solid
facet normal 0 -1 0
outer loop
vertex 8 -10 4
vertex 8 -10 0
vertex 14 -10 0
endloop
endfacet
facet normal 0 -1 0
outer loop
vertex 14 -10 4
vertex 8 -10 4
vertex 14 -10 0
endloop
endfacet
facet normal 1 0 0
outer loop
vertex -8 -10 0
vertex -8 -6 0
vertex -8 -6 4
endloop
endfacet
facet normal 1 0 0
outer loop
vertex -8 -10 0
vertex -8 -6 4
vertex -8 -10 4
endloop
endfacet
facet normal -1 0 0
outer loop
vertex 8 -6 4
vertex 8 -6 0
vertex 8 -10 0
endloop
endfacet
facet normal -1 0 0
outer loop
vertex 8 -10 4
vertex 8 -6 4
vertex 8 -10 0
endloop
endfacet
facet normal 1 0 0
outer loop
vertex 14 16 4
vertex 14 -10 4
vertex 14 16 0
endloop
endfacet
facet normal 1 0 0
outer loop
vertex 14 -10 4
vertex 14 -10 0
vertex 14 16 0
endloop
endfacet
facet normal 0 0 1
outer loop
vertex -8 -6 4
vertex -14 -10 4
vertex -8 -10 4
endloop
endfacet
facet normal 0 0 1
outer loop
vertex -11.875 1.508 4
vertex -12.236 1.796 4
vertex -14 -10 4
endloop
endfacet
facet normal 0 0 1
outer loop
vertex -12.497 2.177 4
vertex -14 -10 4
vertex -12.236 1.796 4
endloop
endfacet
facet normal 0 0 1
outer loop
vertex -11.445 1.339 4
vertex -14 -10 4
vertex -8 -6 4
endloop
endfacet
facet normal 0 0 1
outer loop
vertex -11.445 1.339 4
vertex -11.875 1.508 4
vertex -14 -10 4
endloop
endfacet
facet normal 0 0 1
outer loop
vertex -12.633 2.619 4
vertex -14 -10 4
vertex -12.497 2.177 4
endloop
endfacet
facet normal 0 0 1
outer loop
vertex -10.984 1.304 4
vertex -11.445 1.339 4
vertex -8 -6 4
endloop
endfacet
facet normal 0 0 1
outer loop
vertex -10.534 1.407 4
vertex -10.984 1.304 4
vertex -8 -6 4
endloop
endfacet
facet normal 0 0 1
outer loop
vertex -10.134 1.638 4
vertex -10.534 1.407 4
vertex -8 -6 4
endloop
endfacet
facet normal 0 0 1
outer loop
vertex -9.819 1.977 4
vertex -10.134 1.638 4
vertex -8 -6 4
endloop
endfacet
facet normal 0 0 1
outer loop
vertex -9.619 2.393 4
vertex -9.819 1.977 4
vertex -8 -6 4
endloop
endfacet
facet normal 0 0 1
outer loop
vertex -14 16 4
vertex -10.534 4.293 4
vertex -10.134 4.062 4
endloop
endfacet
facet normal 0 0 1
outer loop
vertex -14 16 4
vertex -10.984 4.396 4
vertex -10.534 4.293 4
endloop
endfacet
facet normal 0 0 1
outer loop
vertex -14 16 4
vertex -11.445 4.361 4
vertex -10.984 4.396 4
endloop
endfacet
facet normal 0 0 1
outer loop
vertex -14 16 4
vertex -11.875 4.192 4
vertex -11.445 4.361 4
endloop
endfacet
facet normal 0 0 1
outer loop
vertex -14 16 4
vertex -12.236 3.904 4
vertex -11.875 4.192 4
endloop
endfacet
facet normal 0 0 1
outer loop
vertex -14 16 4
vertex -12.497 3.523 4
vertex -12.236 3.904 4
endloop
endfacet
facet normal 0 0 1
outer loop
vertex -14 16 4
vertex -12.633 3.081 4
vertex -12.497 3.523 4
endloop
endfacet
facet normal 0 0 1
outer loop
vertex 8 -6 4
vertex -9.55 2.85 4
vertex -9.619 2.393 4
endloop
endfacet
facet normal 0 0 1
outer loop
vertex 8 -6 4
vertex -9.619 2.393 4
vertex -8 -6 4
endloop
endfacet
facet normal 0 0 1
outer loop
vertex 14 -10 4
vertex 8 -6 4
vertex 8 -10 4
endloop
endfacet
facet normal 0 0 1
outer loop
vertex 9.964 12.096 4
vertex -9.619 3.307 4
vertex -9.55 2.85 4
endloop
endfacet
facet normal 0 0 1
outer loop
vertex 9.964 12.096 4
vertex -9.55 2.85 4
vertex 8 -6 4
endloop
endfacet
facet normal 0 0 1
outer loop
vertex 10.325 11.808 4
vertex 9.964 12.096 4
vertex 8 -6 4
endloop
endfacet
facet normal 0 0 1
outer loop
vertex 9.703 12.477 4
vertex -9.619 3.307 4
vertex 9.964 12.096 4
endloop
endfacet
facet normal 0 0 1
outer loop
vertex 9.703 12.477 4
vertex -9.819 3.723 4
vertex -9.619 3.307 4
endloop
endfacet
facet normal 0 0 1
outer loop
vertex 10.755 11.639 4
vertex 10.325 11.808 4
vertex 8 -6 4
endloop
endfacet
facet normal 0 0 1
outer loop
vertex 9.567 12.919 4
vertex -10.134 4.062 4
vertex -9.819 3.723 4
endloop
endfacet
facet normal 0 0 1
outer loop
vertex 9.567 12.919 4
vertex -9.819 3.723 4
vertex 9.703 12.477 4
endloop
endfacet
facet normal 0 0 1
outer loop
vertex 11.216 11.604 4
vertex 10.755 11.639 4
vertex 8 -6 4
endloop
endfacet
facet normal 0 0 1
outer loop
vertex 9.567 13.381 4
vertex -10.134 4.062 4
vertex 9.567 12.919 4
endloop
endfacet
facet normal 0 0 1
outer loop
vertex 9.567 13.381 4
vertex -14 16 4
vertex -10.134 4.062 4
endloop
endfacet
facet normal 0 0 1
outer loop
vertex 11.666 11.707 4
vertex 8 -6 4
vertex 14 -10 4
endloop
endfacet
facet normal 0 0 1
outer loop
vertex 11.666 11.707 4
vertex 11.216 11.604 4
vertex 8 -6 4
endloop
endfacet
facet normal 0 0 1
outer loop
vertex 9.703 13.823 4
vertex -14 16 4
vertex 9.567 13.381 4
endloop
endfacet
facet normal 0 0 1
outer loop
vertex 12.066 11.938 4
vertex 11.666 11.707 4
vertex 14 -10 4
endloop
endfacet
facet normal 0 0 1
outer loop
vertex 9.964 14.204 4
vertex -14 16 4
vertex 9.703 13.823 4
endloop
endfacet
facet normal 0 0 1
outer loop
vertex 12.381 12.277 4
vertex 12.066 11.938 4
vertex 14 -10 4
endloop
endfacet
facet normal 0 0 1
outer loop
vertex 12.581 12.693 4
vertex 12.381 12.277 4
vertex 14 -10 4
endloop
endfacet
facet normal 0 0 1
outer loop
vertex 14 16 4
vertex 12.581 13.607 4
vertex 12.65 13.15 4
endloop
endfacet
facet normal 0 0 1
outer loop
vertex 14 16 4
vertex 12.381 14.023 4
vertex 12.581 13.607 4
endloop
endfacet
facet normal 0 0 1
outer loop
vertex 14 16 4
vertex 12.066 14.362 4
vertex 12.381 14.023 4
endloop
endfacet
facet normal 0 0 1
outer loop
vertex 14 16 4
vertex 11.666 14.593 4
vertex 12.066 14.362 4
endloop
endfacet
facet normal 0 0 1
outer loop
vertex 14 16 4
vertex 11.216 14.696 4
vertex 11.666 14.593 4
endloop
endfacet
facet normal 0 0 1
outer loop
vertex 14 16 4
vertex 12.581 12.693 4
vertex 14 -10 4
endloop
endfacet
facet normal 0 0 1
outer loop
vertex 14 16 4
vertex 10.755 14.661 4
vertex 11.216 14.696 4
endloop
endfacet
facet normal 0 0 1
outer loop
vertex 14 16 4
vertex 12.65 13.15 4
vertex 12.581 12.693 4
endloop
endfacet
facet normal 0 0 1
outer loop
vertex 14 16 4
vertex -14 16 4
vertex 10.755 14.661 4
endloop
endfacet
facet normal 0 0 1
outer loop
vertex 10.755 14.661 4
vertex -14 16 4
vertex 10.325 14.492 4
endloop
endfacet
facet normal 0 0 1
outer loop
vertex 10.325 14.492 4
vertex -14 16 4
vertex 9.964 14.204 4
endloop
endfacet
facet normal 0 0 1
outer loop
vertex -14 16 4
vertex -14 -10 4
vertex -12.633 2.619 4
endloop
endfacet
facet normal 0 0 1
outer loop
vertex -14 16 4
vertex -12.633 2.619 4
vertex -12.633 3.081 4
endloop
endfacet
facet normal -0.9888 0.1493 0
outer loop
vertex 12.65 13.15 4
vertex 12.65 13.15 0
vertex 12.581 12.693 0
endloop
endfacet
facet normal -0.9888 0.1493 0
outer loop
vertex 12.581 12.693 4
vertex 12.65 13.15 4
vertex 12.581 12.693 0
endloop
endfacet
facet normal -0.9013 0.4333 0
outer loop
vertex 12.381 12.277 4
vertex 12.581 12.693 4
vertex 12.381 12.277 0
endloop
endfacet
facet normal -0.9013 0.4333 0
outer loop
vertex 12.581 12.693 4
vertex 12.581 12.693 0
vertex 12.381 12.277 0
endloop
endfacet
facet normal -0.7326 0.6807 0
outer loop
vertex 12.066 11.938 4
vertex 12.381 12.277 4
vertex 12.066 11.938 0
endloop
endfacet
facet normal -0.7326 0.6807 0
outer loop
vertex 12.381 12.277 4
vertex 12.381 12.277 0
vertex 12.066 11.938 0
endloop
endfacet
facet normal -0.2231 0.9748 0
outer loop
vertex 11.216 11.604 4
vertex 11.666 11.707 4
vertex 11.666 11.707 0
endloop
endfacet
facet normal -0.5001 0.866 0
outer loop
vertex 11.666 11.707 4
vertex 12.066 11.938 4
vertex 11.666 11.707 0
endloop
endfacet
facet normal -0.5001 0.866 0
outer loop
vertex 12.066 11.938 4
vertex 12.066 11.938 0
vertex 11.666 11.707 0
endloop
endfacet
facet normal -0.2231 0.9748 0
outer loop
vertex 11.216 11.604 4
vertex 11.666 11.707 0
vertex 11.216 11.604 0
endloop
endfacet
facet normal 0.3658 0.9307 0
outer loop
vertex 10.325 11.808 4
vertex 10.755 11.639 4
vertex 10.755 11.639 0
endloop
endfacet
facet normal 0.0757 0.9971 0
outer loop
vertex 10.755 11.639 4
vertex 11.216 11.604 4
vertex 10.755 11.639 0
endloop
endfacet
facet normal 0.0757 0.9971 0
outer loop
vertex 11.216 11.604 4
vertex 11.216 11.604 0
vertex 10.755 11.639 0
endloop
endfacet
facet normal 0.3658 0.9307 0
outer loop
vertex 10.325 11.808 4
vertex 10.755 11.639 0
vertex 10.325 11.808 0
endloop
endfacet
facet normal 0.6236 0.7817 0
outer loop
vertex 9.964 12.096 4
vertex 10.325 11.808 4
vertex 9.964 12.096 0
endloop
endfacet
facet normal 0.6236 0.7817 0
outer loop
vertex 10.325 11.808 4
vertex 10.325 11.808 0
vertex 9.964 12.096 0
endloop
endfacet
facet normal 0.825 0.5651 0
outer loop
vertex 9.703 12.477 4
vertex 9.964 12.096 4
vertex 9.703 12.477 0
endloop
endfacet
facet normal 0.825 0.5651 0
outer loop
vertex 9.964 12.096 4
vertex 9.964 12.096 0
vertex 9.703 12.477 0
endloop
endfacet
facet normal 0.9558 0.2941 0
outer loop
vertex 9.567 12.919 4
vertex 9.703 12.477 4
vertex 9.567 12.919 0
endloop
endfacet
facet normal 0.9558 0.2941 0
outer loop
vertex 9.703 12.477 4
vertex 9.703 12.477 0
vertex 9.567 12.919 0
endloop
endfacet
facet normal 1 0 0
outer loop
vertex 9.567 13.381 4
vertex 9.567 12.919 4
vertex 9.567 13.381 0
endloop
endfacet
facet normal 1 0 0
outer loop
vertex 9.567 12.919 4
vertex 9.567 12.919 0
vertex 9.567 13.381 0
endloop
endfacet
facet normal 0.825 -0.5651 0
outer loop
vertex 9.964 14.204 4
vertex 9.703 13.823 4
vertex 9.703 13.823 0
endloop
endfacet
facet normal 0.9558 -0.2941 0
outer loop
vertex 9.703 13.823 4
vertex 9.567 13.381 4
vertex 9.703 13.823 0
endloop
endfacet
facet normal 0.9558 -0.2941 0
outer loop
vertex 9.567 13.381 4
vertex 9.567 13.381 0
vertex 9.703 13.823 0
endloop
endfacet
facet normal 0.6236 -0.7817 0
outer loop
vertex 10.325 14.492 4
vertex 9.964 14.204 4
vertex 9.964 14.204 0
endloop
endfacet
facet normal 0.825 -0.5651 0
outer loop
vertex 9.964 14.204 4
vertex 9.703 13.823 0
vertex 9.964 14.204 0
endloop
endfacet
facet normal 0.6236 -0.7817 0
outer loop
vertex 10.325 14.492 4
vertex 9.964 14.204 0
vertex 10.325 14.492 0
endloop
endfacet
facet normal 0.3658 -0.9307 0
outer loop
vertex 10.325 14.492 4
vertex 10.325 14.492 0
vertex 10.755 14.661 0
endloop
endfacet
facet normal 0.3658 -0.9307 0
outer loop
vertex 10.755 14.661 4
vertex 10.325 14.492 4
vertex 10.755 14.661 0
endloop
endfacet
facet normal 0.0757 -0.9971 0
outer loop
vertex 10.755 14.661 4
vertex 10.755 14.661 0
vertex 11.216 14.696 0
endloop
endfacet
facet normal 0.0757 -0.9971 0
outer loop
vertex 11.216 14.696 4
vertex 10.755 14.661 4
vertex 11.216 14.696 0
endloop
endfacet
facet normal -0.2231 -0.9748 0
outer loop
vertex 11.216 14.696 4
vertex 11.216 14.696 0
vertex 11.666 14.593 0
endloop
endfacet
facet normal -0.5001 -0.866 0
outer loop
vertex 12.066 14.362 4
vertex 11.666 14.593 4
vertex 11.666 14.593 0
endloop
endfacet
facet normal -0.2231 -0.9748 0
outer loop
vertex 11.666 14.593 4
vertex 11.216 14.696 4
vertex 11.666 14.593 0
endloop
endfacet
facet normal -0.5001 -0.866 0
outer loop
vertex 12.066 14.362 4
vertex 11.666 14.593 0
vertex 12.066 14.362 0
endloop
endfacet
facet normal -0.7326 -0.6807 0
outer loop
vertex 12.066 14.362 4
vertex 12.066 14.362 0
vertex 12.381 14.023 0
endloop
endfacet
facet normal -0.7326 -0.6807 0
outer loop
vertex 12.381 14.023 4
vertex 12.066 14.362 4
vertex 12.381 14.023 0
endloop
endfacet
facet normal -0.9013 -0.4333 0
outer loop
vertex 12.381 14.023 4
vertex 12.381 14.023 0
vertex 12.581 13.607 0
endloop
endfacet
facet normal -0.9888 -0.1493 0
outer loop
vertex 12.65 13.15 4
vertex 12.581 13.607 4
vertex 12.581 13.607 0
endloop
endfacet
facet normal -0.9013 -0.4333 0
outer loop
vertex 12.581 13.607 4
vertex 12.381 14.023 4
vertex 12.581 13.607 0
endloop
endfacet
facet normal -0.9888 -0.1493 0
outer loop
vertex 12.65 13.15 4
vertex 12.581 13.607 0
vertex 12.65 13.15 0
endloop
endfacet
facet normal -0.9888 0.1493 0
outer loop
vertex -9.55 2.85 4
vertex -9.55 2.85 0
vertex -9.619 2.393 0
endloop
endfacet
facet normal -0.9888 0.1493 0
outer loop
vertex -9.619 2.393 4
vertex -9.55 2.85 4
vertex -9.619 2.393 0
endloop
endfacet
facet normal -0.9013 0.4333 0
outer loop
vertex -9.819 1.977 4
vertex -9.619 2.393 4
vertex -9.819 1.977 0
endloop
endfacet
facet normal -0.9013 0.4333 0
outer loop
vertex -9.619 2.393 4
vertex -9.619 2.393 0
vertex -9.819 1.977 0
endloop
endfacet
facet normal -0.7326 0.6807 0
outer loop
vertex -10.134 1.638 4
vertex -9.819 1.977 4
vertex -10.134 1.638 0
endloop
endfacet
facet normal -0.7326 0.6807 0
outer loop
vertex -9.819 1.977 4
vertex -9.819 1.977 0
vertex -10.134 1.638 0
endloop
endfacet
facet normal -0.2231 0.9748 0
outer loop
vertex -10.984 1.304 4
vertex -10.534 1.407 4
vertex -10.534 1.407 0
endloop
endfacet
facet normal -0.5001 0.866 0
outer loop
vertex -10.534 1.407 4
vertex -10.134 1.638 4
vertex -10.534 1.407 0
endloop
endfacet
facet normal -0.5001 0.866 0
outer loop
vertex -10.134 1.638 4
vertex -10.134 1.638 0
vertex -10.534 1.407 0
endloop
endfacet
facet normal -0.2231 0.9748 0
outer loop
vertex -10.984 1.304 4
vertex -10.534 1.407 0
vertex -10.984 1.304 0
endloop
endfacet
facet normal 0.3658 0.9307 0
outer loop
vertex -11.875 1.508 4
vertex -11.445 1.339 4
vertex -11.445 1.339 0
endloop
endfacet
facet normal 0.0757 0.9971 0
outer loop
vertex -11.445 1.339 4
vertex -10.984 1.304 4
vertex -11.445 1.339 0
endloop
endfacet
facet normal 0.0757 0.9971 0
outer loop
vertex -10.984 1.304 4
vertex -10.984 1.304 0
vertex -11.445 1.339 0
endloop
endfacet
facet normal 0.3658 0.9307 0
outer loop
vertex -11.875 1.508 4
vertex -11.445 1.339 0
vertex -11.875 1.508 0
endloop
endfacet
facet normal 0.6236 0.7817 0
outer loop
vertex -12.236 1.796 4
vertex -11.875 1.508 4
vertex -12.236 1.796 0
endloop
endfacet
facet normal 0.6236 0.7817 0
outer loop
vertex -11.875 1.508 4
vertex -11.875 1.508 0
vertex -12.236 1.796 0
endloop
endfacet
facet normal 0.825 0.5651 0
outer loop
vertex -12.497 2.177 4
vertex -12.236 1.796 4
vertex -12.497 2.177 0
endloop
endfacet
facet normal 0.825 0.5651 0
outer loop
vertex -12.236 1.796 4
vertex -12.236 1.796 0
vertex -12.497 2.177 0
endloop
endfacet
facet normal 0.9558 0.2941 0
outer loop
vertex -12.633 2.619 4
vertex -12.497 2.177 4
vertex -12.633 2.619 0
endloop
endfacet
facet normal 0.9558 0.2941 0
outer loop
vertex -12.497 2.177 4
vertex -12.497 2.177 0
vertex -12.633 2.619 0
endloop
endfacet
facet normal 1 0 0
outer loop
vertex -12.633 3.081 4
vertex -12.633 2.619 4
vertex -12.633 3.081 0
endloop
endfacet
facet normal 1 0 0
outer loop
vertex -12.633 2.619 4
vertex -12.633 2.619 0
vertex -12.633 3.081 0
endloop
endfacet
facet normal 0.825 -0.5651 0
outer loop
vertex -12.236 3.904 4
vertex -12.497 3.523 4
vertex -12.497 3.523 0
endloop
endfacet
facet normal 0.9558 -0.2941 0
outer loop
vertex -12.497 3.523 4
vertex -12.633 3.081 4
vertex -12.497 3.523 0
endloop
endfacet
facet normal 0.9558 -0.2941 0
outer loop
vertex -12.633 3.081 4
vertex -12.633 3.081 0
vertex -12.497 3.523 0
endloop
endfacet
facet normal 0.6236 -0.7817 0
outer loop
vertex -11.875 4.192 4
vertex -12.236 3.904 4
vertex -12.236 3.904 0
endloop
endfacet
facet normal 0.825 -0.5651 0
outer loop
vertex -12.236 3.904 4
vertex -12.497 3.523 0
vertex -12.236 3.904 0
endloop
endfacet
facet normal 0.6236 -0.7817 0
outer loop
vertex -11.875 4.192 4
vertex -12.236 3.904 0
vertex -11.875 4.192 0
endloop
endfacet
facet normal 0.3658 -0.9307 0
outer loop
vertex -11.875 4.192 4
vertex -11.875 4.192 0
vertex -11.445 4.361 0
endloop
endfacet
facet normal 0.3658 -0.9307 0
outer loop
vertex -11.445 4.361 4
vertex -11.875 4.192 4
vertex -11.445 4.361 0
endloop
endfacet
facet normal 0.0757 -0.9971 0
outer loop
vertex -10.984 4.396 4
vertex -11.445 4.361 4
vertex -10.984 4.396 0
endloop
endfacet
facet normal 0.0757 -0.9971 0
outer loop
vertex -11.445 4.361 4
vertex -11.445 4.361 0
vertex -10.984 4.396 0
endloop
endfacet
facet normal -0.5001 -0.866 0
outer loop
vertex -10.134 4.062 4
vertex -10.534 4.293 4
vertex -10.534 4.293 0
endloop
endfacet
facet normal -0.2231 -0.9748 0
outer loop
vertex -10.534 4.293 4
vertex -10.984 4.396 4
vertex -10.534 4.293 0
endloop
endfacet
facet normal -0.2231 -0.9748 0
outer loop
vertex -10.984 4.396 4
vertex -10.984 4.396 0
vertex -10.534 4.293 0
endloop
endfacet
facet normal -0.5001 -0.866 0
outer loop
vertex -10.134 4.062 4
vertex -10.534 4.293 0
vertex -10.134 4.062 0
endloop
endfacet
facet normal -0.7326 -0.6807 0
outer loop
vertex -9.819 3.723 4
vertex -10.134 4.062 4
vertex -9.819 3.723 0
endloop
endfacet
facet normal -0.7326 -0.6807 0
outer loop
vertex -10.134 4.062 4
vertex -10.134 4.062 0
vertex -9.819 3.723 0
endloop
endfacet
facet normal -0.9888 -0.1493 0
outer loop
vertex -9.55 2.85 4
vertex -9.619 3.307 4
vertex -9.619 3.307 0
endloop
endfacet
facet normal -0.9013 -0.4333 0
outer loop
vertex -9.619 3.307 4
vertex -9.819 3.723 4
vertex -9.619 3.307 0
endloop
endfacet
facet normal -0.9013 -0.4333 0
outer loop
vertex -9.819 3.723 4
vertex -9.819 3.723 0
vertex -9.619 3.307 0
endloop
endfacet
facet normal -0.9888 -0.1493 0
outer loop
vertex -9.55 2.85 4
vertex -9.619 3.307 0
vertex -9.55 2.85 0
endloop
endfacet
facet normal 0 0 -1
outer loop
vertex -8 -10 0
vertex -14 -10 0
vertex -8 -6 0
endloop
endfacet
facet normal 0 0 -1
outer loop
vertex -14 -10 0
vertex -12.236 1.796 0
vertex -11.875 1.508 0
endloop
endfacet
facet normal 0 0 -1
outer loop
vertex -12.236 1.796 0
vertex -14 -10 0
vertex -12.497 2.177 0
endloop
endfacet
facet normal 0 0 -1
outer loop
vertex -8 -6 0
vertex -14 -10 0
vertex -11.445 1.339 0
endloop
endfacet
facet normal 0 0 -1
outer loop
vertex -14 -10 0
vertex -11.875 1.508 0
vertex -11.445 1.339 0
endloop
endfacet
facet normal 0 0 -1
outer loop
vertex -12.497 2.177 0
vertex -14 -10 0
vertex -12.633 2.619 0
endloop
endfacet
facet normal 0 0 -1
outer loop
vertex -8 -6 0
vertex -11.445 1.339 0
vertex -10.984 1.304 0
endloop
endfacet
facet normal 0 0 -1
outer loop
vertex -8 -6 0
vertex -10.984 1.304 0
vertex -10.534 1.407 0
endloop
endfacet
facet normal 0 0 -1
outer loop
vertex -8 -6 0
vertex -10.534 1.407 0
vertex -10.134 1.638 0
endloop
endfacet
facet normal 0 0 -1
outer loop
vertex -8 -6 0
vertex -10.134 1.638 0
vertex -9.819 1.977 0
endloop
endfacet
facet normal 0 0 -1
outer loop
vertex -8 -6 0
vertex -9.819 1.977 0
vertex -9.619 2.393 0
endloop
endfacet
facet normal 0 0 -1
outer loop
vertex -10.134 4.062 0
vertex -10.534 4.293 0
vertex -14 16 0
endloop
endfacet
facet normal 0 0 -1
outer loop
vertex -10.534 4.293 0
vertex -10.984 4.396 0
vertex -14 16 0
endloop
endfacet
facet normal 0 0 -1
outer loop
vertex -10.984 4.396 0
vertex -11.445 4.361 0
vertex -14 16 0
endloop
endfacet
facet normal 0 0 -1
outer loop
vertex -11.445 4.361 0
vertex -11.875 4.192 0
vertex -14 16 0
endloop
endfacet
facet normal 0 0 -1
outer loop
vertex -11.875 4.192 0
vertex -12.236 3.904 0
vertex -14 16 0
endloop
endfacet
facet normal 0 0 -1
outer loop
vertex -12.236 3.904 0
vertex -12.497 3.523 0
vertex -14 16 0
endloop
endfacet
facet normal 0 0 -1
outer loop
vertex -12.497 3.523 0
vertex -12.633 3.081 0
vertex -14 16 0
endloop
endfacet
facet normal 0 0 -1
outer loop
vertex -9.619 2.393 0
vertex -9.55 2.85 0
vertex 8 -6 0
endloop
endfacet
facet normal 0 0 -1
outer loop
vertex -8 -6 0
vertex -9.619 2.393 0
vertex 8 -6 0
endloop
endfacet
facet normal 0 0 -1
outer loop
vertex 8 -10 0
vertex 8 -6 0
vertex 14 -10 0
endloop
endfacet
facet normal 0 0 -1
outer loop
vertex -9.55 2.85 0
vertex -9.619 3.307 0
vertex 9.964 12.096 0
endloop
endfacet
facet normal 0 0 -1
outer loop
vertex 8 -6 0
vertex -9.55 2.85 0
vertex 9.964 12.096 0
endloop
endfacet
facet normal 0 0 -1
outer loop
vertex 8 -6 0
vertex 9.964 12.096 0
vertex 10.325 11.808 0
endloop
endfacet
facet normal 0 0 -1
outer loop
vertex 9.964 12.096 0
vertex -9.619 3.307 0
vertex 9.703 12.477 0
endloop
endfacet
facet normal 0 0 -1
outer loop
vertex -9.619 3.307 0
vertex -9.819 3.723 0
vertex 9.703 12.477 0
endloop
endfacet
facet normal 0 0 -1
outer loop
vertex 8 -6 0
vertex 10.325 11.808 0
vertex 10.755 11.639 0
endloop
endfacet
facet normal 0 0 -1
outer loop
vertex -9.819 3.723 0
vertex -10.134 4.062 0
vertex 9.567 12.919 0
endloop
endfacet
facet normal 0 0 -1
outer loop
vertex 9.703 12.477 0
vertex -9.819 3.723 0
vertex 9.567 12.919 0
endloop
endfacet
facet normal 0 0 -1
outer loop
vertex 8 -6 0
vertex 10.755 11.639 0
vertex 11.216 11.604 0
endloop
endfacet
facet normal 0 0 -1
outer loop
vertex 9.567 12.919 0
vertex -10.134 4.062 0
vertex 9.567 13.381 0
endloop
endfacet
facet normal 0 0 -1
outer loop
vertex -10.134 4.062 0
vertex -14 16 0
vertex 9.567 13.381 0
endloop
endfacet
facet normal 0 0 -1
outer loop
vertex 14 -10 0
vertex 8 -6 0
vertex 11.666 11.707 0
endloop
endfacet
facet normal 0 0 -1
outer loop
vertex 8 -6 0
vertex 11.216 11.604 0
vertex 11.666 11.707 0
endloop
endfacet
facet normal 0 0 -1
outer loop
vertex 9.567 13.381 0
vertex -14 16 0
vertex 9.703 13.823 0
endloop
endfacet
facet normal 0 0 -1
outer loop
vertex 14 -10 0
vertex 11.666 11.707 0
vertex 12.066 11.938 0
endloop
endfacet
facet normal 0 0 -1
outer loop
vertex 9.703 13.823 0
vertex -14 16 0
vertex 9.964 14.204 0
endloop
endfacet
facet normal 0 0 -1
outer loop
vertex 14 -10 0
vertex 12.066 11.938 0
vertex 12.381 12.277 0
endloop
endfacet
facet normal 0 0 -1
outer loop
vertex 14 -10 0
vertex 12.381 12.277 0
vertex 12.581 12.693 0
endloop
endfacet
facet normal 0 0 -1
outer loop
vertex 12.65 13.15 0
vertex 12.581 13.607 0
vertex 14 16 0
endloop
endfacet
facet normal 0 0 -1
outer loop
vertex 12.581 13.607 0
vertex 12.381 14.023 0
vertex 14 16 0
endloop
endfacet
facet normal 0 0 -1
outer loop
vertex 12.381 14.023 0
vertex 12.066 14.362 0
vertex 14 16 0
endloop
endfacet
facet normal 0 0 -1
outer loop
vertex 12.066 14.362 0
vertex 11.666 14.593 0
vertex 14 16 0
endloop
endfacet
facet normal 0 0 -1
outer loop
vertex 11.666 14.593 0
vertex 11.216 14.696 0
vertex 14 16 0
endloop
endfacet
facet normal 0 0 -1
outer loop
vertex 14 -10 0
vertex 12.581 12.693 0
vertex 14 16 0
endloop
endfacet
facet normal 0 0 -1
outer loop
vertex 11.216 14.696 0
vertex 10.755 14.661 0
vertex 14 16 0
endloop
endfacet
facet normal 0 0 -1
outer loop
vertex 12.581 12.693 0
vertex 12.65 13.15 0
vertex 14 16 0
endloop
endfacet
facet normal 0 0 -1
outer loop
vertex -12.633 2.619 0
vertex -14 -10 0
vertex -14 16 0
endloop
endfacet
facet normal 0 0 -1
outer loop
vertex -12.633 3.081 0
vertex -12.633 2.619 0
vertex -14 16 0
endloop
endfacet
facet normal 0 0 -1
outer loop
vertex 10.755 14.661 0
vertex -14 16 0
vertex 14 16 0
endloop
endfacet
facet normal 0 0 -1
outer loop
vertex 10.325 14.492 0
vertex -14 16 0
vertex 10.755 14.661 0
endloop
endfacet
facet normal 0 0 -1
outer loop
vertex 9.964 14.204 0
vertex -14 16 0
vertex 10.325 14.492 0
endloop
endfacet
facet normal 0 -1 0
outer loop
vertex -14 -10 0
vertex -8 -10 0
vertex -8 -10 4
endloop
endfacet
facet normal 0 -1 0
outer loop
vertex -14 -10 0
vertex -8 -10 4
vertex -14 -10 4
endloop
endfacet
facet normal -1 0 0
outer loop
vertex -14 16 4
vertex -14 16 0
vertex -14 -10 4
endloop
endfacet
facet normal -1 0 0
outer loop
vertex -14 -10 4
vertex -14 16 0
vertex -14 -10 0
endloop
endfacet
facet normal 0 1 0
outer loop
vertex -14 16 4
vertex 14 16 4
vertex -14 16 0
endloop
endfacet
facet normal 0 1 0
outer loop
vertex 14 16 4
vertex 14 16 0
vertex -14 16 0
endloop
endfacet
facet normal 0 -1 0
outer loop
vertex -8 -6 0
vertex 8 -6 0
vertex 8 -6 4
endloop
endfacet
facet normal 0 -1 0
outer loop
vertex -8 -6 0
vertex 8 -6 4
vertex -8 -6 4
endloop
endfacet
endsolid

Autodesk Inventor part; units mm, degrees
ref_plane "YZ Plane" through (0, 0, 0) normal (1, 0, 0) x (0, 1, 0)
ref_plane "XZ Plane" through (0, 0, 0) normal (0, 1, 0) x (-1, 0, 0)
ref_plane "XY Plane" through (0, 0, 0) normal (0, 0, 1) x (1, 0, 0)
sketch "Sketch1" plane through (0, 0, 0) normal (0, 0, 1) x (1, 0, 0)
  line L0 (-14, 0) -> (14, 0)
  line L1 (14, 0) -> (14, 16)
  line L2 (14, 16) -> (-14, 16)
  line L3 (-14, 16) -> (-14, 0)
  circle A0 centre (-11.1, 2.85) radius 1.55
  circle A1 centre (11.1, 13.15) radius 1.55
  line L4 (-11.1, 2.85) -> (-14, 2.85) construction
  line L5 (11.1, 13.15) -> (14, 13.15) construction
  line L6 (11.1, 13.15) -> (11.1, 16) construction
  line L7 (-11.1, 2.85) -> (-11.1, 0) construction
  line L8 (-14, 0) -> (14, 0) construction
  line L9 (14, 0) -> (14, -6)
  line L10 (14, -6) -> (8, -6) construction
  line L11 (-14, -6) -> (-14, 0)
  line L12 (-14, -6) -> (-8, -6) construction
  line L13 (-8, -6) -> (-8, -10)
  line L14 (-8, -10) -> (-14, -10)
  line L15 (-14, -10) -> (-14, -6)
  line L16 (14, -6) -> (8, -6) construction
  line L17 (8, -6) -> (8, -10)
  line L18 (8, -10) -> (14, -10)
  line L19 (14, -10) -> (14, -6)
  line L20 (-8, -6) -> (-14, -6) construction
  line L21 (8, -6) -> (-8, -6)
  point P0 (0, 0)
  point P1 (0, 0)
  point P2 (14, 0)
  point P3 (14, 0)
  dimension "d0" = 3.1
  dimension "d1" = 22.2
  dimension "d2" = 10.3
  dimension "d3" = 16
  dimension "d4" = 28
  dimension "d5" = 22
  dimension "d8" = 6
  dimension "d9" = 6
  dimension "d10" = 4
extrude "Extrusion1" add sketch "Sketch1" along normal blind 4
properties part number "SwitchHolder_V2" material "Wood (Oak)"
